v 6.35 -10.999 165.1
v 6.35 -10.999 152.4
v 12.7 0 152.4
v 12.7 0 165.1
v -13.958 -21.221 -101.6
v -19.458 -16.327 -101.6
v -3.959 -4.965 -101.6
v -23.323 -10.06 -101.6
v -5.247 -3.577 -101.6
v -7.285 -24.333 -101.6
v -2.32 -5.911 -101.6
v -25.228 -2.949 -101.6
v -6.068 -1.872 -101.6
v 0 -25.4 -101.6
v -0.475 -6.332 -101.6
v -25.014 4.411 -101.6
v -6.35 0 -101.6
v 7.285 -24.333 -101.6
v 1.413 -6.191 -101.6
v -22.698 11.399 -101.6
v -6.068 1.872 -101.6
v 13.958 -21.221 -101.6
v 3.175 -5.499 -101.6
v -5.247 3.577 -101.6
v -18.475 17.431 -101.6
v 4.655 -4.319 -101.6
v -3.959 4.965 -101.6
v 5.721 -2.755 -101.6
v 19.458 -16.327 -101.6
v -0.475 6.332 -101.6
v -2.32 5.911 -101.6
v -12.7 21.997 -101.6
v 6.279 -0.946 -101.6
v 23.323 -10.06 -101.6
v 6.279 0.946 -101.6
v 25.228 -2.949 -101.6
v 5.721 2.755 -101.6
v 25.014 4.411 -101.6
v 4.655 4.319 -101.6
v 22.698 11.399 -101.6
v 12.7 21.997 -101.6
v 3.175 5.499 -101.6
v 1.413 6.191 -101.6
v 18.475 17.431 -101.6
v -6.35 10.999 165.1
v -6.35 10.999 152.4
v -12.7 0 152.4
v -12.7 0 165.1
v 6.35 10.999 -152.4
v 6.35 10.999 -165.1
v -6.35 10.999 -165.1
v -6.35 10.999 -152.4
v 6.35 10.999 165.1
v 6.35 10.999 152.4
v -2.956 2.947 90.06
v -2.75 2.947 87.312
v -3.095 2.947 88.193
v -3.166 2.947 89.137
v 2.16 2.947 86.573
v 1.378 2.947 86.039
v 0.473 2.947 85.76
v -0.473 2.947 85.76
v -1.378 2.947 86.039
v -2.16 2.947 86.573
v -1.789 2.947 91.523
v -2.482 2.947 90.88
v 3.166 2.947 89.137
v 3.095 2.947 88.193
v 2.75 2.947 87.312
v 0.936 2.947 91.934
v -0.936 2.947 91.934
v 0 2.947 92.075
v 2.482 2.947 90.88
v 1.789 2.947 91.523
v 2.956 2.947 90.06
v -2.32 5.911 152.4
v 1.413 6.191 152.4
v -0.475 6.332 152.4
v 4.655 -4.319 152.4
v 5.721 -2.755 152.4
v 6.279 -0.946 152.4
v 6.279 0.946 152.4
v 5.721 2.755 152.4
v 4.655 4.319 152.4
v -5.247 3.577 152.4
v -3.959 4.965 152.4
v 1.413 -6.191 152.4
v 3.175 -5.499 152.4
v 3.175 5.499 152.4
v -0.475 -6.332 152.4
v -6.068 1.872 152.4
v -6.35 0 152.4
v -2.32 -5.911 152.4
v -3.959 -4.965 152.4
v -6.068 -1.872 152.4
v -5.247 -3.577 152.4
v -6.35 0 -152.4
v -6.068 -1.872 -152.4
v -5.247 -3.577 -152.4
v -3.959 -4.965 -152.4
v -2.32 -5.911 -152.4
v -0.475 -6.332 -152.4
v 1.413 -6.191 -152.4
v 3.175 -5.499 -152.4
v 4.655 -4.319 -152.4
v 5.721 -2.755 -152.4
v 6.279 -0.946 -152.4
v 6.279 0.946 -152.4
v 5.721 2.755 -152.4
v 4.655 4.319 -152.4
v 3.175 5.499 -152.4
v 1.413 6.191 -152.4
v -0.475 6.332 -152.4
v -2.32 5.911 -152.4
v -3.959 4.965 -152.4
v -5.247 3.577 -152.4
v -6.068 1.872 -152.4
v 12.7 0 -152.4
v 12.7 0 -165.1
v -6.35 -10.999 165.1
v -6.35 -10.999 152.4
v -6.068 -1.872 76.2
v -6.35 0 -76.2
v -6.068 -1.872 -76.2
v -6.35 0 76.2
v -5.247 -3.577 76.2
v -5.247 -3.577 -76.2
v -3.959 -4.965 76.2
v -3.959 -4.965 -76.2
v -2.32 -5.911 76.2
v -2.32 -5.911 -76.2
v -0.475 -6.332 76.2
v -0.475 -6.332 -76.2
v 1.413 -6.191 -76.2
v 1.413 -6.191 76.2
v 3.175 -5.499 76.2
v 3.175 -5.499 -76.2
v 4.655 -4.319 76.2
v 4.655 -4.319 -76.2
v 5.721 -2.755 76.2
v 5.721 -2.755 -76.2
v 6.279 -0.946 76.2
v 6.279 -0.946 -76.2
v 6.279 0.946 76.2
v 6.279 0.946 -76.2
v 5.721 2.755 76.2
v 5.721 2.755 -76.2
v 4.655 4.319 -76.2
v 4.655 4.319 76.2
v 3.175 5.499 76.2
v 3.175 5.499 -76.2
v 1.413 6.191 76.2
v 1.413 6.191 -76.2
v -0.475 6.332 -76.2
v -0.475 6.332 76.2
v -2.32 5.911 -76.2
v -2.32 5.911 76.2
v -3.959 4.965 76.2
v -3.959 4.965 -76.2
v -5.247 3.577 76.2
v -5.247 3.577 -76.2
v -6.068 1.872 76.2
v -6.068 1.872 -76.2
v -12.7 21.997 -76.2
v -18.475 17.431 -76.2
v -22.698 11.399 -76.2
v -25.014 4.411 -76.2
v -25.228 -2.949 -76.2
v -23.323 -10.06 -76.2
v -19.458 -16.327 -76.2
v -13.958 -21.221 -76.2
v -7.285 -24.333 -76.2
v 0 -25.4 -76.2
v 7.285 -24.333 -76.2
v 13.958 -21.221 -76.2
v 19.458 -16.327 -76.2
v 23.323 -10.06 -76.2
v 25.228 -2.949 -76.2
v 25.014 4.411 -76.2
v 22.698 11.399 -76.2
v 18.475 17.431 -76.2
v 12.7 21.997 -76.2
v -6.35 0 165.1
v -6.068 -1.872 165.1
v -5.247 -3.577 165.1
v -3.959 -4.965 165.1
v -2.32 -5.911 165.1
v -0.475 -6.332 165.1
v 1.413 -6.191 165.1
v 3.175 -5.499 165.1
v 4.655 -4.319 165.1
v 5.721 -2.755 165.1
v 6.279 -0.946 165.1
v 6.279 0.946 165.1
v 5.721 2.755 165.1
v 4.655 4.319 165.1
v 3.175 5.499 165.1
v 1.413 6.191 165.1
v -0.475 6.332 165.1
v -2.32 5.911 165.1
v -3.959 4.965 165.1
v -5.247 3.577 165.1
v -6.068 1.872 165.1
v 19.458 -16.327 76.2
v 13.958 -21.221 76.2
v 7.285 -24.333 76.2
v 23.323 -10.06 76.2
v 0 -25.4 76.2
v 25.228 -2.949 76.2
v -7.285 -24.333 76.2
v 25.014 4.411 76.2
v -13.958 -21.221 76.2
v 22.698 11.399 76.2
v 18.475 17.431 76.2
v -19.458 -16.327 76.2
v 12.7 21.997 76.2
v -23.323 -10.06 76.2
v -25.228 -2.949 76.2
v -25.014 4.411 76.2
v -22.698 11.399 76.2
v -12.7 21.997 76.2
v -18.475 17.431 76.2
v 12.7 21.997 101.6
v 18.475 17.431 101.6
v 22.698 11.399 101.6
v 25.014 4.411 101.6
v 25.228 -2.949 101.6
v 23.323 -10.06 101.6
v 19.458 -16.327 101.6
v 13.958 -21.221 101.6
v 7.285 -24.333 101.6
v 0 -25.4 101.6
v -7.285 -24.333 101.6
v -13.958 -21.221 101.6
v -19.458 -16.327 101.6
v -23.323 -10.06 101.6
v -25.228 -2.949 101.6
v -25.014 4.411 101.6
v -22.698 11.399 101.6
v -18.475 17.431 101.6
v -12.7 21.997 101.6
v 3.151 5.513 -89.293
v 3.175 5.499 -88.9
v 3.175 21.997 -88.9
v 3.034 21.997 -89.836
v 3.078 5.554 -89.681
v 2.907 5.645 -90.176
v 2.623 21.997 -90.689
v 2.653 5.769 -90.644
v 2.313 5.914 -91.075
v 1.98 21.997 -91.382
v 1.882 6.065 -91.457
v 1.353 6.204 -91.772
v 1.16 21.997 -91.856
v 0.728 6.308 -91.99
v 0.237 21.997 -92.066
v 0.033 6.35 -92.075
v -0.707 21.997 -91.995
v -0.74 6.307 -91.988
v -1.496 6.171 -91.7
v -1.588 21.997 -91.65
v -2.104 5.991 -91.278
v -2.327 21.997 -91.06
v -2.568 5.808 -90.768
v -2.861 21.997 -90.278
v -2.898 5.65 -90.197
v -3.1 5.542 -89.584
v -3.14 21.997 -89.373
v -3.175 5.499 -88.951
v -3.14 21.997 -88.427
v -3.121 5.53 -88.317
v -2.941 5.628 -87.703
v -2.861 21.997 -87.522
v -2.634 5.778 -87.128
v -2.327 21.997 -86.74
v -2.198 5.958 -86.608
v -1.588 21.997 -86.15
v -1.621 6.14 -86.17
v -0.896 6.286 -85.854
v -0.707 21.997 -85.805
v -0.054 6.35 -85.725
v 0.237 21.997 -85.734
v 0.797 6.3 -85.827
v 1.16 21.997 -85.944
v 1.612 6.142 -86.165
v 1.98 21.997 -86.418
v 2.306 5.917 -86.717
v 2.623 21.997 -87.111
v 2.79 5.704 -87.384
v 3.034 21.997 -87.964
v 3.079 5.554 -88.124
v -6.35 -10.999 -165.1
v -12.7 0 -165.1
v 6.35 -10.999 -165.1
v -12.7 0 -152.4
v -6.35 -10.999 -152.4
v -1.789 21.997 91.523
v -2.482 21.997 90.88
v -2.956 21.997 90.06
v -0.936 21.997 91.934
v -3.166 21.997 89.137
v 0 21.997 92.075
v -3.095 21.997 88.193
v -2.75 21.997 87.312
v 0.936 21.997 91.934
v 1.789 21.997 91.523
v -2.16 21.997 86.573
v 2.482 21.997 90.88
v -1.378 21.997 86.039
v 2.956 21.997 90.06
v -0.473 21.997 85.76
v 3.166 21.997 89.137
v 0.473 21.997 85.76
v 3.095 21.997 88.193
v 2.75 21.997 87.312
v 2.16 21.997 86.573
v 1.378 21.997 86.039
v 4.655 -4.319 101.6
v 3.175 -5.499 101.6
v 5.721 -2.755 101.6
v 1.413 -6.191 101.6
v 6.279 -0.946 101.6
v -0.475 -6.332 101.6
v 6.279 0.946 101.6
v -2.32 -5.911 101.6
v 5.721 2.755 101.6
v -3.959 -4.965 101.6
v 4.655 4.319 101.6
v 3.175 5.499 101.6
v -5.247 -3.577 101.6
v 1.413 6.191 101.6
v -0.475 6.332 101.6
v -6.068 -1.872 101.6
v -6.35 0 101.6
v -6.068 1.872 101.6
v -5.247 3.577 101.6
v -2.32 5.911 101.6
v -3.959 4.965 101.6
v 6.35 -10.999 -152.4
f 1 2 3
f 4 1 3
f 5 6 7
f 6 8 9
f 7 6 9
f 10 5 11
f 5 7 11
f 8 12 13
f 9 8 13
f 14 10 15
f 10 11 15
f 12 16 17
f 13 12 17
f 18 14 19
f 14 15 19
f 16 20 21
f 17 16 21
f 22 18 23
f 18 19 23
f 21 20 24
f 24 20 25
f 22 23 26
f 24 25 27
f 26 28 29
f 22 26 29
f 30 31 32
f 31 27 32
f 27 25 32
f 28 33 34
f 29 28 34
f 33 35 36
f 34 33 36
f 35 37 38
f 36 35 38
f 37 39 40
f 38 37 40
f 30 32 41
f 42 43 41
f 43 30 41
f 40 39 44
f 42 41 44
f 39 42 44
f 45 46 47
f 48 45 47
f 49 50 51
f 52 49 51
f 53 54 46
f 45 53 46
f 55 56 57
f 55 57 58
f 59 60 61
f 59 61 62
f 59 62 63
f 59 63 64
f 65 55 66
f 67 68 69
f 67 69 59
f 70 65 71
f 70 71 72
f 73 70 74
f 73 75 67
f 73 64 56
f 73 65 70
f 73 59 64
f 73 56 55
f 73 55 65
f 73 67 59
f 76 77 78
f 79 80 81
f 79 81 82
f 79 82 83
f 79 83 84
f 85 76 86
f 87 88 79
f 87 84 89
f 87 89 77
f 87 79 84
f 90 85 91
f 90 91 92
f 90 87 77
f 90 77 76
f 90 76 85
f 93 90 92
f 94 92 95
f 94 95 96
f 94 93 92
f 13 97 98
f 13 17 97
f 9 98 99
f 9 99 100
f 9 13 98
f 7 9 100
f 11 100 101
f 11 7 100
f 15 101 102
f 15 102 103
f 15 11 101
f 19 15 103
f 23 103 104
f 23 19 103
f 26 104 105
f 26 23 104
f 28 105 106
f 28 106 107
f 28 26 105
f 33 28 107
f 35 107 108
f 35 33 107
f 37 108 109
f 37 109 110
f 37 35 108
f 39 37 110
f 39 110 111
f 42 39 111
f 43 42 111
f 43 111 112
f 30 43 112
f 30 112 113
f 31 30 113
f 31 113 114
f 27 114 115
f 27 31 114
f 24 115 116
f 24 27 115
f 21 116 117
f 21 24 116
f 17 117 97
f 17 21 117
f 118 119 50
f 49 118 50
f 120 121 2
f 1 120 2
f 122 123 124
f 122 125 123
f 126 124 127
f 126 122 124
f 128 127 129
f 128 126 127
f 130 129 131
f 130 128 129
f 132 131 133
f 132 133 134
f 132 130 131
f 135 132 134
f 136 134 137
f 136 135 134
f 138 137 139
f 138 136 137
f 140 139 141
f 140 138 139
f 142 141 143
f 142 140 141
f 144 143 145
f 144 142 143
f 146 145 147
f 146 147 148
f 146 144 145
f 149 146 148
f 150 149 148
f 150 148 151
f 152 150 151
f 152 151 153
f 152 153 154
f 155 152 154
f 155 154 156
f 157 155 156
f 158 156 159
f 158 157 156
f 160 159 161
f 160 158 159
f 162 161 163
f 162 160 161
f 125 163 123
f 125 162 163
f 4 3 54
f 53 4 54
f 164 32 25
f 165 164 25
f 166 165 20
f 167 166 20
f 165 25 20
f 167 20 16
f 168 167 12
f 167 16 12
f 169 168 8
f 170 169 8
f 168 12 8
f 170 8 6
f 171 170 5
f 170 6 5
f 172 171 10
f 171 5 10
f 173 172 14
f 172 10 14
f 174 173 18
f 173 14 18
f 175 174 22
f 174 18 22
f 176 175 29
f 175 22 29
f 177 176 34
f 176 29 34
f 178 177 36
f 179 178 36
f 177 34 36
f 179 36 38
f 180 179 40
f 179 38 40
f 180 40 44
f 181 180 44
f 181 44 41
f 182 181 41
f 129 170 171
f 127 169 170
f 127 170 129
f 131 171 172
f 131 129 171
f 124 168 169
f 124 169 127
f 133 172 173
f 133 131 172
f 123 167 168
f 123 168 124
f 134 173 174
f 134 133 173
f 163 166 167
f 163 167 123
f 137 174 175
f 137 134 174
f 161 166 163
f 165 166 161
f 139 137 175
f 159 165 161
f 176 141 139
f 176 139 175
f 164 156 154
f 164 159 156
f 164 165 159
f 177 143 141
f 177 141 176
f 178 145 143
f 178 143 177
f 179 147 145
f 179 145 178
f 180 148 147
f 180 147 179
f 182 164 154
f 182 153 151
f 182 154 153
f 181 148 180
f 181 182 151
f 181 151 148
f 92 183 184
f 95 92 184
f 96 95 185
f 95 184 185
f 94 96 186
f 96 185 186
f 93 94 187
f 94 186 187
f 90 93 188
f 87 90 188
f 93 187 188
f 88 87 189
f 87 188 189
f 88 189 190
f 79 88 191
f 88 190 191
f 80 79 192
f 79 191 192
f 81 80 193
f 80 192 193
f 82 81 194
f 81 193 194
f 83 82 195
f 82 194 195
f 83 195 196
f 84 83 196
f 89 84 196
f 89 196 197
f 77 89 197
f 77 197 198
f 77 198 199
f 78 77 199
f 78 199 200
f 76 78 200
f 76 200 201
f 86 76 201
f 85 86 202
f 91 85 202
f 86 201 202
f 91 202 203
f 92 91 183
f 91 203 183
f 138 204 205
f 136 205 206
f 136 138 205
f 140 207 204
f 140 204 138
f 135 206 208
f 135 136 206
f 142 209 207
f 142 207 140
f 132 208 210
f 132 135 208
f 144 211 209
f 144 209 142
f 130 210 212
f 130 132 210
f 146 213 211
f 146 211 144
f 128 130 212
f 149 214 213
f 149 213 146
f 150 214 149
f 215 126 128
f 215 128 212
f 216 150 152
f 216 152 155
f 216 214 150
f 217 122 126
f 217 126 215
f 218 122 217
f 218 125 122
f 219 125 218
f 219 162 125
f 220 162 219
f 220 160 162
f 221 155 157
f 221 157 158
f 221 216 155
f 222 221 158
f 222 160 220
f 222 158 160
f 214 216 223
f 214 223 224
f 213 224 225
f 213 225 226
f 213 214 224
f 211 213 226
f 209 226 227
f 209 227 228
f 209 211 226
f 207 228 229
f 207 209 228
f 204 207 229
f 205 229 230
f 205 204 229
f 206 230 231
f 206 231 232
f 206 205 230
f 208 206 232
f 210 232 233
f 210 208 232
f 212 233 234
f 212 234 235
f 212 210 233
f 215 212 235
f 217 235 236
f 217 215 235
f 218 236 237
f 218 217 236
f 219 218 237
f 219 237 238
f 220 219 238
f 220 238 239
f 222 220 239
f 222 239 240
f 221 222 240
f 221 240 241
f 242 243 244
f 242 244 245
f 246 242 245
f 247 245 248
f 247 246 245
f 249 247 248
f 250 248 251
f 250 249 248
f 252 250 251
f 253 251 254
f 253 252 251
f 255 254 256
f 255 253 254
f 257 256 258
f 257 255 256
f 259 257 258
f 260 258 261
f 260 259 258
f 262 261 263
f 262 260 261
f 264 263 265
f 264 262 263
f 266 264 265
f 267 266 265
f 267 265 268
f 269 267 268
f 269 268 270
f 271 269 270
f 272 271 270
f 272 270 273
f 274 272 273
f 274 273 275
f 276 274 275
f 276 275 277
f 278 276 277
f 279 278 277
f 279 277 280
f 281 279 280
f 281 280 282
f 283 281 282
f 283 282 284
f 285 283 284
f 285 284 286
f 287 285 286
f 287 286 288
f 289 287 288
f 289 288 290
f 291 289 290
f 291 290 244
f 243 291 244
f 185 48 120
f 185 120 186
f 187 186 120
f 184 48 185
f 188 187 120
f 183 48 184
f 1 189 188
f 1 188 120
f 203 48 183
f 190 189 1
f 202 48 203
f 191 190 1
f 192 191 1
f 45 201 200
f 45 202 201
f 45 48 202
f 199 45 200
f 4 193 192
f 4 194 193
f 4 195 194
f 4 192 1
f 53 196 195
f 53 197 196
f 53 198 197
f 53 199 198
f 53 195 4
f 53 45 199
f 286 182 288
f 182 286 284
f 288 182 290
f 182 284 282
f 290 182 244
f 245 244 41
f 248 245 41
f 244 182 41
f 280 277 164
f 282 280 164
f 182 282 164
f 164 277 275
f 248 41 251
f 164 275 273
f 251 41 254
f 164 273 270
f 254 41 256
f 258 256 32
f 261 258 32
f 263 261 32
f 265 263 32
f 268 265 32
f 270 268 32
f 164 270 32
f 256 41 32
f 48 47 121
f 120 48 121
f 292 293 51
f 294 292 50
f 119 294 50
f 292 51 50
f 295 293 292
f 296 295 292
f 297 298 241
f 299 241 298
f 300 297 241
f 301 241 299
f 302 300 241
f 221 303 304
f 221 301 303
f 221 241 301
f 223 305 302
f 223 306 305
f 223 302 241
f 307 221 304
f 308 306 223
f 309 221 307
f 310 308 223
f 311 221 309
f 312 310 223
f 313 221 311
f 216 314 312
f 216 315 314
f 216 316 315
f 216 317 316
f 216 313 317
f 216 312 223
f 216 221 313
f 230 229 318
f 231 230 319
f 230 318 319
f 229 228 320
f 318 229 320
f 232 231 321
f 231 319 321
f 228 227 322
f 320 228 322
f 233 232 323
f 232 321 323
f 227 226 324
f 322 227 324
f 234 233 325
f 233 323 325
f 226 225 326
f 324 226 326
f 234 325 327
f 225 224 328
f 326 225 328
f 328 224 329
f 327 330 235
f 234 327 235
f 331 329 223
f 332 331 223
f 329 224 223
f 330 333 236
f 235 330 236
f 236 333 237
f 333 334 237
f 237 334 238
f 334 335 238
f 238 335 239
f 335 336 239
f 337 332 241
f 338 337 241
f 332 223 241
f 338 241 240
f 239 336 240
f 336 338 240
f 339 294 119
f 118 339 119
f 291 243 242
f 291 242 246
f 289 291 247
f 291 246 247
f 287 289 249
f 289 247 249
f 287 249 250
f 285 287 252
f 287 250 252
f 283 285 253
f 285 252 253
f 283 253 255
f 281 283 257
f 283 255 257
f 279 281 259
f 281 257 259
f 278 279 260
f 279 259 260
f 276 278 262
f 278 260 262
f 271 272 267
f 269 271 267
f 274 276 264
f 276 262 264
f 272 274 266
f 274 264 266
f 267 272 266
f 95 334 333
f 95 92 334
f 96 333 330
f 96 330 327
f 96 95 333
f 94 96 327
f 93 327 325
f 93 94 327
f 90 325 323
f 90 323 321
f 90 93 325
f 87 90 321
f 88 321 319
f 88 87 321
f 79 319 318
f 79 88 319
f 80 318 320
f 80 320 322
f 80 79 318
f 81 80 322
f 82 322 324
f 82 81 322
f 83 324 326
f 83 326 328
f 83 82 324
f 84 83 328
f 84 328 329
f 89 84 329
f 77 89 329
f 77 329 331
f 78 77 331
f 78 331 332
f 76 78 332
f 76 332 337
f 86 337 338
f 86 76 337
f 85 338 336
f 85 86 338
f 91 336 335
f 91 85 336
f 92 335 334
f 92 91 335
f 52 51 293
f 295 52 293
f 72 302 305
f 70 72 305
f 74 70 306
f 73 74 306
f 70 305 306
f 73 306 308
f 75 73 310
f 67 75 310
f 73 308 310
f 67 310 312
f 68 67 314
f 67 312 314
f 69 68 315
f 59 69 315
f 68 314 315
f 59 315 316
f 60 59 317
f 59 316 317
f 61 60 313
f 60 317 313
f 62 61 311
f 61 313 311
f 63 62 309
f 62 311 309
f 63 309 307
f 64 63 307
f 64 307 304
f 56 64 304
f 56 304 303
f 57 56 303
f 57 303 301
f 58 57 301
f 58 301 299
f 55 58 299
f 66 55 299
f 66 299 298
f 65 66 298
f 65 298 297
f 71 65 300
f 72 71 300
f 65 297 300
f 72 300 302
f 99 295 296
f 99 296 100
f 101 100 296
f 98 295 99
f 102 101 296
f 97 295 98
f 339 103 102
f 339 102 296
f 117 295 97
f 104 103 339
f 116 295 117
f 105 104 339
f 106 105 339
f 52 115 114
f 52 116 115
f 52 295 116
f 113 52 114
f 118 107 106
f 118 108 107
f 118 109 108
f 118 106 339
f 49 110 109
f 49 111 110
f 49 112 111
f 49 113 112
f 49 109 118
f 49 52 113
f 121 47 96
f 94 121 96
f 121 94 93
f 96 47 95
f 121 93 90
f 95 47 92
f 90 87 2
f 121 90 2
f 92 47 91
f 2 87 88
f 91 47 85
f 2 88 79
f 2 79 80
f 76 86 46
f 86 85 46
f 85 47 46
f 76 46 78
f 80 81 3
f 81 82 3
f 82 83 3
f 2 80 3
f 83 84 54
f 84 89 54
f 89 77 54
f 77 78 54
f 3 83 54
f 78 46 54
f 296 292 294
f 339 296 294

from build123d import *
from OCP.BRepAlgoAPI import BRepAlgoAPI_Cut
from OCP.TopTools import TopTools_ListOfShape

# Parameters (mm, degrees)
SKETCH1_R           = 6.35
BOSS_EXTRUDE1_DEPTH = 152.4
BOSS_EXTRUDE2_DEPTH = 12.7
SKETCH3_R           = 6.35
CUT_EXTRUDE1_DEPTH  = 12.7
BOSS_EXTRUDE3_DEPTH = 25.4
SKETCH5_R           = 3.175
CUT_EXTRUDE2_DEPTH  = 19.05
MIRROR1_START       = -101.6
MIRROR1_OUTLINE_R   = 6.35
MIRROR1_DEPTH       = 25.4
MIRROR1_START_2     = -165.1
MIRROR1_2_DEPTH     = 12.7
MIRROR1_START_3     = 5.499260123
MIRROR1_3_OUTLINE_R = 3.175
MIRROR1_3_DEPTH     = 16.497785133
MIRROR1_START_4     = -93
MIRROR1_4_DEPTH     = 7.275


with BuildPart() as part:
    # Sketch1 → Boss-Extrude1 (new, symmetric)
    with BuildSketch(Plane.XY):
        with Locations(Location((0, 0, 0), (0, 0, 180))):
            Circle(SKETCH1_R)
    extrude(amount=BOSS_EXTRUDE1_DEPTH, both=True)

    # Sketch2 → Boss-Extrude2 (add)
    with BuildSketch(Plane.XY.offset(152.4)):
        Polygon((6.35, -10.998522628), (12.7, 0), (6.35, 10.998522628), (-6.35, 10.998522628), (-12.7, 0), (-6.35, -10.998522628), align=None)
    extrude(amount=BOSS_EXTRUDE2_DEPTH)

    # Sketch3 → Cut-Extrude1 (cut)
    with BuildSketch(Plane.XY.offset(165.1)):
        with Locations(Location((0, 0, 0), (0, 0, 180))):
            Circle(SKETCH3_R)
    extrude(amount=-CUT_EXTRUDE1_DEPTH, mode=Mode.SUBTRACT)


with BuildPart() as cut_extrude1_piece_1:
    # of the separate pieces the step leaves, piece 1, a body of its own (cut_extrude1_pieces)
    add(part.part.solids().sort_by_distance((-6.35, 0, -152.4))[0])

    # Sketch4 → Boss-Extrude3 (add)
    with BuildSketch(Plane.XY.offset(76.2)):
        with BuildLine():
            Line((-12.7, 21.997045256), (12.7, 21.997045256))
            ThreePointArc((12.7, 21.997045256), (0, -25.4), (-12.7, 21.997045256))
        make_face()
    extrude(amount=BOSS_EXTRUDE3_DEPTH)

    # Sketch5 → Cut-Extrude2 (cut)
    with BuildSketch(Plane(origin=(0, 21.997045256, 0), x_dir=(1, 0, 0), z_dir=(0, 1, 0))):
        with Locations(Location((0, -88.9, 0), (0, 0, 270))):
            Circle(SKETCH5_R)
    extrude(amount=-CUT_EXTRUDE2_DEPTH, mode=Mode.SUBTRACT)


with BuildPart() as cut_extrude1_piece_2:
    # of the separate pieces the step leaves, piece 2, a body of its own (cut_extrude1_pieces)
    add(part.part.solids().sort_by_distance((6.35, -10.998522628, 152.4))[0])


with BuildPart() as mirror1_tool:
    # Mirror1: read off the stored shape, not the designer's step
    # Mirror1 outline → Mirror1 (new body)
    with BuildSketch(Plane.XY.offset(MIRROR1_START)):
        with BuildLine():
            Line((12.7, 21.997045256), (-12.7, 21.997045256))
            ThreePointArc((-12.7, 21.997045256), (0, -25.4), (12.7, 21.997045256))
        make_face()
        Circle(MIRROR1_OUTLINE_R, mode=Mode.SUBTRACT)
    extrude(amount=MIRROR1_DEPTH)


with BuildPart() as cut_extrude1_piece_1_1:
    add(cut_extrude1_piece_1.part)


with BuildPart() as cut_extrude1_piece_1_2:
    # Mirror1: joined with mirror1_tool
    add(cut_extrude1_piece_1_1.part.fuse(mirror1_tool.part, tol=0.00001))


with BuildPart() as mirror1_2_tool:
    # Mirror1 2 outline → Mirror1 2 (new body)
    with BuildSketch(Plane.XY.offset(MIRROR1_START_2)):
        Polygon((-12.7, 0), (-6.35, -10.998522628), (6.35, -10.998522628), (12.7, 0), (6.35, 10.998522628), (-6.35, 10.998522628), align=None)
    extrude(amount=MIRROR1_2_DEPTH)


with BuildPart() as cut_extrude1_piece_1_3:
    add(cut_extrude1_piece_1_2.part)


with BuildPart() as cut_extrude1_piece_1_4:
    # Mirror1 2: joined with mirror1_2_tool
    add(cut_extrude1_piece_1_3.part.fuse(mirror1_2_tool.part, tol=0.00001))


with BuildPart() as mirror1_3_tool:
    # Mirror1 3 outline → Mirror1 3 (new body)
    with BuildSketch(Plane(origin=(0, 0, 0), x_dir=(1, 0, 0), z_dir=(0, 1, 0)).offset(MIRROR1_START_3)):
        with Locations((0, 88.9)):
            Circle(MIRROR1_3_OUTLINE_R)
    extrude(amount=MIRROR1_3_DEPTH)


with BuildPart() as cut_extrude1_piece_1_5:
    add(cut_extrude1_piece_1_4.part)

    # Mirror1 3: cut by mirror1_3_tool, with a tolerance
    mirror1_3_stock = TopTools_ListOfShape()
    mirror1_3_stock.Append(cut_extrude1_piece_1_5.part.wrapped)
    mirror1_3_tools = TopTools_ListOfShape()
    mirror1_3_tools.Append(mirror1_3_tool.part.wrapped)
    mirror1_3_cut = BRepAlgoAPI_Cut()
    mirror1_3_cut.SetArguments(mirror1_3_stock)
    mirror1_3_cut.SetTools(mirror1_3_tools)
    mirror1_3_cut.SetFuzzyValue(0.00001)
    mirror1_3_cut.Build()
    add(Compound.cast(mirror1_3_cut.Shape()).solids(), mode=Mode.REPLACE)


with BuildPart() as mirror1_4_tool:
    # Mirror1 4 outline → Mirror1 4 (new body)
    with BuildSketch(Plane.XY.offset(MIRROR1_START_4)):
        with BuildLine():
            ThreePointArc((3.175000516, 5.499261016), (0, 6.35), (-3.175000515, 5.499261016))
            Line((-3.175000515, 5.499261016), (3.175000516, 5.499261016))
        make_face()
    extrude(amount=MIRROR1_4_DEPTH)


with BuildPart() as cut_extrude1_piece_1_6:
    add(cut_extrude1_piece_1_5.part)


with BuildPart() as cut_extrude1_piece_1_7:
    # Mirror1 4: joined with mirror1_4_tool
    add(cut_extrude1_piece_1_6.part.fuse(mirror1_4_tool.part, tol=0.00001))


solid = Compound([cut_extrude1_piece_2.part, cut_extrude1_piece_1_7.part])
